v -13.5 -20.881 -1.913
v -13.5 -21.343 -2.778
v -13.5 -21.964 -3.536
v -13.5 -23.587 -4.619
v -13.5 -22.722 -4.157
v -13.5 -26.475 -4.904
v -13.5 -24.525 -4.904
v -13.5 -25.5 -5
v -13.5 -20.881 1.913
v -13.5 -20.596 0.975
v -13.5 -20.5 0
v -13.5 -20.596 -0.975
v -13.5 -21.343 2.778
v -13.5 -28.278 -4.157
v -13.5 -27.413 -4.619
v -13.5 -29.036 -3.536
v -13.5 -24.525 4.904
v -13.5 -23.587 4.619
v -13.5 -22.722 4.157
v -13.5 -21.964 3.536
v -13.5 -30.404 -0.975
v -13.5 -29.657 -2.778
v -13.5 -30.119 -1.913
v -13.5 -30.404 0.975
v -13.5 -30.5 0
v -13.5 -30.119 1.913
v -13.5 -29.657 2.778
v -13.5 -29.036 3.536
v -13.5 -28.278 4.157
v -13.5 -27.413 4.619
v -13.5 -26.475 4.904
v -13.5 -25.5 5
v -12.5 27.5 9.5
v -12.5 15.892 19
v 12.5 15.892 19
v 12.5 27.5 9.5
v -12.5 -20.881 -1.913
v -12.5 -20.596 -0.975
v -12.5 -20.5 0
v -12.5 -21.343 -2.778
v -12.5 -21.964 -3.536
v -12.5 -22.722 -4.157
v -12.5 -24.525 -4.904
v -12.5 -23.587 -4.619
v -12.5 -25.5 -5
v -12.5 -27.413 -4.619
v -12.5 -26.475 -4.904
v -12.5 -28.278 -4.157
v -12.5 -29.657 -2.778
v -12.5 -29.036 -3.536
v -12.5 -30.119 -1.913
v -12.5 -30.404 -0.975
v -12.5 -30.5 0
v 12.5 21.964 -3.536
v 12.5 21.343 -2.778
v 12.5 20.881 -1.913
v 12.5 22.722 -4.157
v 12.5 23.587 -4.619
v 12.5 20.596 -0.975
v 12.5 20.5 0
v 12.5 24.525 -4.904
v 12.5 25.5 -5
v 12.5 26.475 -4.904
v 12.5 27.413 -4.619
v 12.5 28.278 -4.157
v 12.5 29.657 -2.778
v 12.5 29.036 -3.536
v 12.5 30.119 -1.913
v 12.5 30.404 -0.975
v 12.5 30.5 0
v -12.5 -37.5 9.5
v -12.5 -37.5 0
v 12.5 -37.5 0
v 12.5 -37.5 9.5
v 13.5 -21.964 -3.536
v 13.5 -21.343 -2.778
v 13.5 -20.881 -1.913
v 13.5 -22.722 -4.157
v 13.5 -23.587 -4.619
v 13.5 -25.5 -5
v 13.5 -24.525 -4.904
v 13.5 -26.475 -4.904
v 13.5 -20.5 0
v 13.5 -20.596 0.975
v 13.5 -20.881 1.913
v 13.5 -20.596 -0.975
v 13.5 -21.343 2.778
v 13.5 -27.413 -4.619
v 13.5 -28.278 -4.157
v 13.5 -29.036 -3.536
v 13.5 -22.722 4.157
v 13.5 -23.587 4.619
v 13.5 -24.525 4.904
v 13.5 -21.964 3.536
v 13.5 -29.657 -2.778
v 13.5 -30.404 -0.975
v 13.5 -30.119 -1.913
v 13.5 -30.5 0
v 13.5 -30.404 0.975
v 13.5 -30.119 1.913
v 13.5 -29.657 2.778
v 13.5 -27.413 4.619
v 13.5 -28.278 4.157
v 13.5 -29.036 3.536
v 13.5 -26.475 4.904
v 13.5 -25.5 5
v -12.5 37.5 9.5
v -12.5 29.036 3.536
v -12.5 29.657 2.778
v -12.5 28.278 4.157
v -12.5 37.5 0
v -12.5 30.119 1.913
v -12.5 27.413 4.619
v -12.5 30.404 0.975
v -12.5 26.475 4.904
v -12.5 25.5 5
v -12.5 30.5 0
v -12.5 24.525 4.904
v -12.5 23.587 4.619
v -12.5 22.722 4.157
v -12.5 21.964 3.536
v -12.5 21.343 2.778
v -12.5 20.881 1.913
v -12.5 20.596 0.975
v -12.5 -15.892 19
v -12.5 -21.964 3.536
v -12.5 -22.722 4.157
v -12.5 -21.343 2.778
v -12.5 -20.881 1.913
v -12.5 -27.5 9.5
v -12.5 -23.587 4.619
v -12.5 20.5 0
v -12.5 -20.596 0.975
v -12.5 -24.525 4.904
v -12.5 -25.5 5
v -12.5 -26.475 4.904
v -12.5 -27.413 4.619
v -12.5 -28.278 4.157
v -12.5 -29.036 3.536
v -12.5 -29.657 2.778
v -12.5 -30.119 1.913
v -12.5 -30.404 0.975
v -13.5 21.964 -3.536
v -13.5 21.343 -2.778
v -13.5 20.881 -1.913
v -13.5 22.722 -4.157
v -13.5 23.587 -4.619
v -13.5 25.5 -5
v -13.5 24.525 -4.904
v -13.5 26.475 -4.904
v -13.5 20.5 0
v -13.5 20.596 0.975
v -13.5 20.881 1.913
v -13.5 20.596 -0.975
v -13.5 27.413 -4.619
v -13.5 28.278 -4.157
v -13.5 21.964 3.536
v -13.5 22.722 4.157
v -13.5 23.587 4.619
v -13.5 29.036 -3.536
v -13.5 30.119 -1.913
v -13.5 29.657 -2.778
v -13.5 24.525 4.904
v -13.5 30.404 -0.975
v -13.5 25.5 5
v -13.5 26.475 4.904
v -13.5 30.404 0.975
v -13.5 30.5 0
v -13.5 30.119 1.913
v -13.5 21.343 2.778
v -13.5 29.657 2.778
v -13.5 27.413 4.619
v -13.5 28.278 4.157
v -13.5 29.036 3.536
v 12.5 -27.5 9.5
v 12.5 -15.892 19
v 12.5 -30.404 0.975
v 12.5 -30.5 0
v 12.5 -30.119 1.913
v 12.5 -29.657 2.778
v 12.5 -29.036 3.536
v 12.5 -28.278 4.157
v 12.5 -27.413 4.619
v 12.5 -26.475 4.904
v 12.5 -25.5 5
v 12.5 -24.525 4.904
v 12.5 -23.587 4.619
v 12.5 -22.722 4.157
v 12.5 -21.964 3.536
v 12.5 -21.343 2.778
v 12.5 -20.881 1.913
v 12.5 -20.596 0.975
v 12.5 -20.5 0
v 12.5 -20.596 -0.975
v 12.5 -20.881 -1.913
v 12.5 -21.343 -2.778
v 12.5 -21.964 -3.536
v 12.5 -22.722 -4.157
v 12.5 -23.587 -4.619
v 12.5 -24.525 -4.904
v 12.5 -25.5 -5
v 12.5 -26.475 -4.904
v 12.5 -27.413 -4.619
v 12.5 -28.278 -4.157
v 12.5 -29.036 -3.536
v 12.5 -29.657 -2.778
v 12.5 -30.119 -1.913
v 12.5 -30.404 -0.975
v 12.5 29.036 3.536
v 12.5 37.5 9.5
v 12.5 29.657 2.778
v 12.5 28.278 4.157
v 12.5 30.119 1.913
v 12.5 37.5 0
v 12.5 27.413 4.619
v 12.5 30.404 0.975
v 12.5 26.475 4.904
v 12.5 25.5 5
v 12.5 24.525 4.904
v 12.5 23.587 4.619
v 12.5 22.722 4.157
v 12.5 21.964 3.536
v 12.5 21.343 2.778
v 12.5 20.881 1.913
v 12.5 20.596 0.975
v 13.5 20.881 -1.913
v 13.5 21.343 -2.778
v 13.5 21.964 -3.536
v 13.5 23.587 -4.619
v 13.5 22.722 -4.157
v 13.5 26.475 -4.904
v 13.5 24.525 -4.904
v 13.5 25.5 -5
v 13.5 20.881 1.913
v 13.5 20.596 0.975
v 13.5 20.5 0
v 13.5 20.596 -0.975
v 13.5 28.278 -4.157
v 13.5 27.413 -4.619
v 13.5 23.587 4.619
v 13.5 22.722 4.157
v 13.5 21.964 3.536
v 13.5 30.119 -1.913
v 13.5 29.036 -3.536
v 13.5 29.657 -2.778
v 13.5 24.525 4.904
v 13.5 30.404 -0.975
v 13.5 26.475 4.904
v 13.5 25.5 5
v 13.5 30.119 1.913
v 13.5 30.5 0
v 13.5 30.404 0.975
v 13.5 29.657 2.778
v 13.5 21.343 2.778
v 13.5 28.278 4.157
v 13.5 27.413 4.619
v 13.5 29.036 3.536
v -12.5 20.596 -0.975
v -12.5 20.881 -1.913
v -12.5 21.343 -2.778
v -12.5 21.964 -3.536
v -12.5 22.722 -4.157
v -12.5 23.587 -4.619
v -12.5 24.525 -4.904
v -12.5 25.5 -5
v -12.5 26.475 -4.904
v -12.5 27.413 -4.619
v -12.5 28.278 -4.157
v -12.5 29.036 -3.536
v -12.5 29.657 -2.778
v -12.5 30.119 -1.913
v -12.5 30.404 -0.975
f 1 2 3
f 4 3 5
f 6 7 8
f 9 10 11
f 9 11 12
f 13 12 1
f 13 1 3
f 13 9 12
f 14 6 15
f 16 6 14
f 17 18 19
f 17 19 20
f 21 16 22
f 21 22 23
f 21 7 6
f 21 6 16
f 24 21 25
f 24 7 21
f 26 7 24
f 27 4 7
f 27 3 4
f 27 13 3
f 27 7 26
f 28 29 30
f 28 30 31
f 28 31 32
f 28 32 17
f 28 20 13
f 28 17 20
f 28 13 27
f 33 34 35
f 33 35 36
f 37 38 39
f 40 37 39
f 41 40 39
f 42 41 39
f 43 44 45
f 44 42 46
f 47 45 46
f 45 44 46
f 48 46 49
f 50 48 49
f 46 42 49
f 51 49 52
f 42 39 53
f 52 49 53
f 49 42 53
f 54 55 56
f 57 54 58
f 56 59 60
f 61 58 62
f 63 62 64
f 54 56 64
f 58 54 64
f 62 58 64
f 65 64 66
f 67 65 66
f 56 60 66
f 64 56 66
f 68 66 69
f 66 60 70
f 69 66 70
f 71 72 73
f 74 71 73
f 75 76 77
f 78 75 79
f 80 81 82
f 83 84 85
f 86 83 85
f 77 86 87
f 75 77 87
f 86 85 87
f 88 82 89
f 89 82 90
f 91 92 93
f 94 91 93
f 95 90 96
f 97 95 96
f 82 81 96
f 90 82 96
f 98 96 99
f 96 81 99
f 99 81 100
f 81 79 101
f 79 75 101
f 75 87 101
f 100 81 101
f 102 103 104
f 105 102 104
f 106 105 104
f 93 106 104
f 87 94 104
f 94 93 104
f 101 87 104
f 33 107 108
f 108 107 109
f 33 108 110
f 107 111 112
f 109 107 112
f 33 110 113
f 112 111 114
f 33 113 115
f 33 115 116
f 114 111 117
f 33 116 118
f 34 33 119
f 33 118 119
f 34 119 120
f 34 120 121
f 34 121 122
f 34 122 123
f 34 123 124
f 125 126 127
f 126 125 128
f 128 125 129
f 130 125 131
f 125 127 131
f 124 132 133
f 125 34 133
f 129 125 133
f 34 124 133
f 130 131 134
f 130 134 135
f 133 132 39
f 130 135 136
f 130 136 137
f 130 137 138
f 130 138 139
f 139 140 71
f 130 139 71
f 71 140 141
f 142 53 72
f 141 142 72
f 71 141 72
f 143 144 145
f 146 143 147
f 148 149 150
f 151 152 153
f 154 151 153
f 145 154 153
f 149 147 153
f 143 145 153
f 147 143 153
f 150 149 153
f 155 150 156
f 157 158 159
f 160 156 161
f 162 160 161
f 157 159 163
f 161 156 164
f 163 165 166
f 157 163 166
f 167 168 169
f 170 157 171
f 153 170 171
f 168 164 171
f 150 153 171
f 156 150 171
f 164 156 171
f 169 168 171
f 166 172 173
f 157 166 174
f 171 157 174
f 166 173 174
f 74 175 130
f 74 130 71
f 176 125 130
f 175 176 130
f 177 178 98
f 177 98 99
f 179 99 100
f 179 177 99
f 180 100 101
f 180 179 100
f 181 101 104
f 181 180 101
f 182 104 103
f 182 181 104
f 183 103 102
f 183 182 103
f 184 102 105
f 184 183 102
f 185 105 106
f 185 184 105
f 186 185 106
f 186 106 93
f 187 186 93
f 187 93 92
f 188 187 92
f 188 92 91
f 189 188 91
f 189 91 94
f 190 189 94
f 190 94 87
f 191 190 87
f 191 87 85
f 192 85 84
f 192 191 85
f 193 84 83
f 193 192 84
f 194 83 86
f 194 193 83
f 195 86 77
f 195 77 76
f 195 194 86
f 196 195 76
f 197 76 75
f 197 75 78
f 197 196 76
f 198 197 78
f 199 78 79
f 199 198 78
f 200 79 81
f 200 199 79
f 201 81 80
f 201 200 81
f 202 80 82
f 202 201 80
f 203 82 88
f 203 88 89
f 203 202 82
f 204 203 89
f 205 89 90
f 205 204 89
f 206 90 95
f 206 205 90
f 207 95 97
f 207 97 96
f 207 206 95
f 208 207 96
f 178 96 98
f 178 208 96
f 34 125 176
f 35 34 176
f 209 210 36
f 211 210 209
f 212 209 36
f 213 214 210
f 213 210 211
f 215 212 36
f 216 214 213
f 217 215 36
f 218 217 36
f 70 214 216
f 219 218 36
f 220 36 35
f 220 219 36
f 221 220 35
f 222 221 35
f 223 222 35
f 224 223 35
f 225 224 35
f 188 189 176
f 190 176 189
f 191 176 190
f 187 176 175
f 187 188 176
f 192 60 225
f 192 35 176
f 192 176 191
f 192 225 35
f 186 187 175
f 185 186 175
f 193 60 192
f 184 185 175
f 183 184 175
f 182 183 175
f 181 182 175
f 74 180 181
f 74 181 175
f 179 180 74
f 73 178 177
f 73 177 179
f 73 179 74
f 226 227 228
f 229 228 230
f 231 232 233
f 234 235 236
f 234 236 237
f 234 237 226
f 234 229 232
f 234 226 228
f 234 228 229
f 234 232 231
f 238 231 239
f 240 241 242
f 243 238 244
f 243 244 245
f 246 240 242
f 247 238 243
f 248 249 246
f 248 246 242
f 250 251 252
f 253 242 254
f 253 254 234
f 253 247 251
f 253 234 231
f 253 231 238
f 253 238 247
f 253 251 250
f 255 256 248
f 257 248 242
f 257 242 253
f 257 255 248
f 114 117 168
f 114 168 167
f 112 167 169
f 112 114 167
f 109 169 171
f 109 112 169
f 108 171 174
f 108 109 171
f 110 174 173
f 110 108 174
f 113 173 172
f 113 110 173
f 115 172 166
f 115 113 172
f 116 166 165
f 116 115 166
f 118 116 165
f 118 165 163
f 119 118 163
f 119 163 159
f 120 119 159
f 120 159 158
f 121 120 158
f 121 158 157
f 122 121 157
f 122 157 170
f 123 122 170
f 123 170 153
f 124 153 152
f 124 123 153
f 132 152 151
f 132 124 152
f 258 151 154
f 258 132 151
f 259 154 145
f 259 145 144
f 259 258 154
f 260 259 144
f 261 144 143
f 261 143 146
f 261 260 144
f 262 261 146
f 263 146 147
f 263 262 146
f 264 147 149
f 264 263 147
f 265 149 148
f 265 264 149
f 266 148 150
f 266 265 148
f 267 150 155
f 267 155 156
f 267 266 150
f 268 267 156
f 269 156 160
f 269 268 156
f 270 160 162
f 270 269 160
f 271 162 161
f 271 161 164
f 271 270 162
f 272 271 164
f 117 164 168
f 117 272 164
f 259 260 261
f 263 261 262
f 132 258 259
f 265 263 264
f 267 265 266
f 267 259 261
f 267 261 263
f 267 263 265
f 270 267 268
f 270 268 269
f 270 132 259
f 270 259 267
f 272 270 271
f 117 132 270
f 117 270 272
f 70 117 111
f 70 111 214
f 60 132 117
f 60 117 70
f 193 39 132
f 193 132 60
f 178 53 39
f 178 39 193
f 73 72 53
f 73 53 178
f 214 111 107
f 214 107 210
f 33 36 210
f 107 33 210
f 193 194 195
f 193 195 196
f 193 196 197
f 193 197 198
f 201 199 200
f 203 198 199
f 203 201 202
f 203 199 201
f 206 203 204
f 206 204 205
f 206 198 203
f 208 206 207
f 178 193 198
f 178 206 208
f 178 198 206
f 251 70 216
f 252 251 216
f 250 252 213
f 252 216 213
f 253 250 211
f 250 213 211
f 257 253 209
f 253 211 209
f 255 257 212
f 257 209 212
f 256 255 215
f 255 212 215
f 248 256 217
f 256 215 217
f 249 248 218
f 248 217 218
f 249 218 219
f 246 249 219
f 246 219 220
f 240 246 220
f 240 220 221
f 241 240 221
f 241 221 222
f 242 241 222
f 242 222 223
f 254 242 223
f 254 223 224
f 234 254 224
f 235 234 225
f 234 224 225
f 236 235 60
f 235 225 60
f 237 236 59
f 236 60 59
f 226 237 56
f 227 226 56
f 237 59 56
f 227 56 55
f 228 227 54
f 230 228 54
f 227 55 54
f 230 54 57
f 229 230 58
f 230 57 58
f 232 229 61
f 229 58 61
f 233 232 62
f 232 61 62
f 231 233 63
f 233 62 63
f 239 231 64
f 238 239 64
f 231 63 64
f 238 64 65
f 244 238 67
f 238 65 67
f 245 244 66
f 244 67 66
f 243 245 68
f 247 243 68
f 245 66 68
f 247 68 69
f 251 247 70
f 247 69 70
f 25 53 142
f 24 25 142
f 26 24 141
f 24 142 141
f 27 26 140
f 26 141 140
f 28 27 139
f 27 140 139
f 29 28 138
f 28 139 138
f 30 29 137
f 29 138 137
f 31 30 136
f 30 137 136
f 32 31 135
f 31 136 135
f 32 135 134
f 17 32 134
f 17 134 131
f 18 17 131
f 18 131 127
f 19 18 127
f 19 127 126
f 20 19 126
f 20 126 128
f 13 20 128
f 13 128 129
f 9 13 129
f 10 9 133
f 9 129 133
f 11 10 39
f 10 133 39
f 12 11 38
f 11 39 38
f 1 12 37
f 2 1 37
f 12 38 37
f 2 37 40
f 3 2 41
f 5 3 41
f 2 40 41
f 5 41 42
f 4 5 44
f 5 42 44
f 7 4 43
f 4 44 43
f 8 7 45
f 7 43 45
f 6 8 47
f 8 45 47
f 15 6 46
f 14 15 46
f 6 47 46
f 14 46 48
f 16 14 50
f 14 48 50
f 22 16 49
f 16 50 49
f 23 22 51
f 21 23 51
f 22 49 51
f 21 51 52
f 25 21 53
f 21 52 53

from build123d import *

# Parameters (mm, degrees)
F0_W     = 25
F0_H     = 37.5
F1_DEPTH = 19
F2_R     = 5
F3_DEPTH = 1
F5_DEPTH = 25.001


with BuildPart() as f1:
    # F0 (on Top) → F1 (new body)
    with BuildSketch(Plane.XY):
        with Locations((0, 18.75)):
            Rectangle(F0_W, F0_H)
    extrude(amount=F1_DEPTH)

    # F4 (on face) → F5 (cut, through all)
    with BuildSketch(Plane.YZ.offset(12.5)):
        Polygon((27.5, 9.5), (37.5, 9.5), (37.5, 19), (15.8918132338, 19), align=None)
    extrude(amount=-F5_DEPTH, mode=Mode.SUBTRACT)



with BuildPart() as f3:
    # F2 (on face) → F3 (new body)
    with BuildSketch(Plane.YZ.offset(12.5)):
        with Locations((25.5, 0)):
            Circle(F2_R)
    extrude(amount=F3_DEPTH)


with BuildPart() as f1_1:
    add(f1.part)

    add(f3.part)  # F6 merges F3
    # F6: F1, F3 across plane
    add(f1.part.mirror(Plane.YZ))
    add(f3.part.mirror(Plane.YZ))

    # F7: F1 across plane


with BuildPart() as f1_2:
    add(f1_1.part)
    add(f1_1.part.mirror(Plane.XZ))


solid = f1_2.part
